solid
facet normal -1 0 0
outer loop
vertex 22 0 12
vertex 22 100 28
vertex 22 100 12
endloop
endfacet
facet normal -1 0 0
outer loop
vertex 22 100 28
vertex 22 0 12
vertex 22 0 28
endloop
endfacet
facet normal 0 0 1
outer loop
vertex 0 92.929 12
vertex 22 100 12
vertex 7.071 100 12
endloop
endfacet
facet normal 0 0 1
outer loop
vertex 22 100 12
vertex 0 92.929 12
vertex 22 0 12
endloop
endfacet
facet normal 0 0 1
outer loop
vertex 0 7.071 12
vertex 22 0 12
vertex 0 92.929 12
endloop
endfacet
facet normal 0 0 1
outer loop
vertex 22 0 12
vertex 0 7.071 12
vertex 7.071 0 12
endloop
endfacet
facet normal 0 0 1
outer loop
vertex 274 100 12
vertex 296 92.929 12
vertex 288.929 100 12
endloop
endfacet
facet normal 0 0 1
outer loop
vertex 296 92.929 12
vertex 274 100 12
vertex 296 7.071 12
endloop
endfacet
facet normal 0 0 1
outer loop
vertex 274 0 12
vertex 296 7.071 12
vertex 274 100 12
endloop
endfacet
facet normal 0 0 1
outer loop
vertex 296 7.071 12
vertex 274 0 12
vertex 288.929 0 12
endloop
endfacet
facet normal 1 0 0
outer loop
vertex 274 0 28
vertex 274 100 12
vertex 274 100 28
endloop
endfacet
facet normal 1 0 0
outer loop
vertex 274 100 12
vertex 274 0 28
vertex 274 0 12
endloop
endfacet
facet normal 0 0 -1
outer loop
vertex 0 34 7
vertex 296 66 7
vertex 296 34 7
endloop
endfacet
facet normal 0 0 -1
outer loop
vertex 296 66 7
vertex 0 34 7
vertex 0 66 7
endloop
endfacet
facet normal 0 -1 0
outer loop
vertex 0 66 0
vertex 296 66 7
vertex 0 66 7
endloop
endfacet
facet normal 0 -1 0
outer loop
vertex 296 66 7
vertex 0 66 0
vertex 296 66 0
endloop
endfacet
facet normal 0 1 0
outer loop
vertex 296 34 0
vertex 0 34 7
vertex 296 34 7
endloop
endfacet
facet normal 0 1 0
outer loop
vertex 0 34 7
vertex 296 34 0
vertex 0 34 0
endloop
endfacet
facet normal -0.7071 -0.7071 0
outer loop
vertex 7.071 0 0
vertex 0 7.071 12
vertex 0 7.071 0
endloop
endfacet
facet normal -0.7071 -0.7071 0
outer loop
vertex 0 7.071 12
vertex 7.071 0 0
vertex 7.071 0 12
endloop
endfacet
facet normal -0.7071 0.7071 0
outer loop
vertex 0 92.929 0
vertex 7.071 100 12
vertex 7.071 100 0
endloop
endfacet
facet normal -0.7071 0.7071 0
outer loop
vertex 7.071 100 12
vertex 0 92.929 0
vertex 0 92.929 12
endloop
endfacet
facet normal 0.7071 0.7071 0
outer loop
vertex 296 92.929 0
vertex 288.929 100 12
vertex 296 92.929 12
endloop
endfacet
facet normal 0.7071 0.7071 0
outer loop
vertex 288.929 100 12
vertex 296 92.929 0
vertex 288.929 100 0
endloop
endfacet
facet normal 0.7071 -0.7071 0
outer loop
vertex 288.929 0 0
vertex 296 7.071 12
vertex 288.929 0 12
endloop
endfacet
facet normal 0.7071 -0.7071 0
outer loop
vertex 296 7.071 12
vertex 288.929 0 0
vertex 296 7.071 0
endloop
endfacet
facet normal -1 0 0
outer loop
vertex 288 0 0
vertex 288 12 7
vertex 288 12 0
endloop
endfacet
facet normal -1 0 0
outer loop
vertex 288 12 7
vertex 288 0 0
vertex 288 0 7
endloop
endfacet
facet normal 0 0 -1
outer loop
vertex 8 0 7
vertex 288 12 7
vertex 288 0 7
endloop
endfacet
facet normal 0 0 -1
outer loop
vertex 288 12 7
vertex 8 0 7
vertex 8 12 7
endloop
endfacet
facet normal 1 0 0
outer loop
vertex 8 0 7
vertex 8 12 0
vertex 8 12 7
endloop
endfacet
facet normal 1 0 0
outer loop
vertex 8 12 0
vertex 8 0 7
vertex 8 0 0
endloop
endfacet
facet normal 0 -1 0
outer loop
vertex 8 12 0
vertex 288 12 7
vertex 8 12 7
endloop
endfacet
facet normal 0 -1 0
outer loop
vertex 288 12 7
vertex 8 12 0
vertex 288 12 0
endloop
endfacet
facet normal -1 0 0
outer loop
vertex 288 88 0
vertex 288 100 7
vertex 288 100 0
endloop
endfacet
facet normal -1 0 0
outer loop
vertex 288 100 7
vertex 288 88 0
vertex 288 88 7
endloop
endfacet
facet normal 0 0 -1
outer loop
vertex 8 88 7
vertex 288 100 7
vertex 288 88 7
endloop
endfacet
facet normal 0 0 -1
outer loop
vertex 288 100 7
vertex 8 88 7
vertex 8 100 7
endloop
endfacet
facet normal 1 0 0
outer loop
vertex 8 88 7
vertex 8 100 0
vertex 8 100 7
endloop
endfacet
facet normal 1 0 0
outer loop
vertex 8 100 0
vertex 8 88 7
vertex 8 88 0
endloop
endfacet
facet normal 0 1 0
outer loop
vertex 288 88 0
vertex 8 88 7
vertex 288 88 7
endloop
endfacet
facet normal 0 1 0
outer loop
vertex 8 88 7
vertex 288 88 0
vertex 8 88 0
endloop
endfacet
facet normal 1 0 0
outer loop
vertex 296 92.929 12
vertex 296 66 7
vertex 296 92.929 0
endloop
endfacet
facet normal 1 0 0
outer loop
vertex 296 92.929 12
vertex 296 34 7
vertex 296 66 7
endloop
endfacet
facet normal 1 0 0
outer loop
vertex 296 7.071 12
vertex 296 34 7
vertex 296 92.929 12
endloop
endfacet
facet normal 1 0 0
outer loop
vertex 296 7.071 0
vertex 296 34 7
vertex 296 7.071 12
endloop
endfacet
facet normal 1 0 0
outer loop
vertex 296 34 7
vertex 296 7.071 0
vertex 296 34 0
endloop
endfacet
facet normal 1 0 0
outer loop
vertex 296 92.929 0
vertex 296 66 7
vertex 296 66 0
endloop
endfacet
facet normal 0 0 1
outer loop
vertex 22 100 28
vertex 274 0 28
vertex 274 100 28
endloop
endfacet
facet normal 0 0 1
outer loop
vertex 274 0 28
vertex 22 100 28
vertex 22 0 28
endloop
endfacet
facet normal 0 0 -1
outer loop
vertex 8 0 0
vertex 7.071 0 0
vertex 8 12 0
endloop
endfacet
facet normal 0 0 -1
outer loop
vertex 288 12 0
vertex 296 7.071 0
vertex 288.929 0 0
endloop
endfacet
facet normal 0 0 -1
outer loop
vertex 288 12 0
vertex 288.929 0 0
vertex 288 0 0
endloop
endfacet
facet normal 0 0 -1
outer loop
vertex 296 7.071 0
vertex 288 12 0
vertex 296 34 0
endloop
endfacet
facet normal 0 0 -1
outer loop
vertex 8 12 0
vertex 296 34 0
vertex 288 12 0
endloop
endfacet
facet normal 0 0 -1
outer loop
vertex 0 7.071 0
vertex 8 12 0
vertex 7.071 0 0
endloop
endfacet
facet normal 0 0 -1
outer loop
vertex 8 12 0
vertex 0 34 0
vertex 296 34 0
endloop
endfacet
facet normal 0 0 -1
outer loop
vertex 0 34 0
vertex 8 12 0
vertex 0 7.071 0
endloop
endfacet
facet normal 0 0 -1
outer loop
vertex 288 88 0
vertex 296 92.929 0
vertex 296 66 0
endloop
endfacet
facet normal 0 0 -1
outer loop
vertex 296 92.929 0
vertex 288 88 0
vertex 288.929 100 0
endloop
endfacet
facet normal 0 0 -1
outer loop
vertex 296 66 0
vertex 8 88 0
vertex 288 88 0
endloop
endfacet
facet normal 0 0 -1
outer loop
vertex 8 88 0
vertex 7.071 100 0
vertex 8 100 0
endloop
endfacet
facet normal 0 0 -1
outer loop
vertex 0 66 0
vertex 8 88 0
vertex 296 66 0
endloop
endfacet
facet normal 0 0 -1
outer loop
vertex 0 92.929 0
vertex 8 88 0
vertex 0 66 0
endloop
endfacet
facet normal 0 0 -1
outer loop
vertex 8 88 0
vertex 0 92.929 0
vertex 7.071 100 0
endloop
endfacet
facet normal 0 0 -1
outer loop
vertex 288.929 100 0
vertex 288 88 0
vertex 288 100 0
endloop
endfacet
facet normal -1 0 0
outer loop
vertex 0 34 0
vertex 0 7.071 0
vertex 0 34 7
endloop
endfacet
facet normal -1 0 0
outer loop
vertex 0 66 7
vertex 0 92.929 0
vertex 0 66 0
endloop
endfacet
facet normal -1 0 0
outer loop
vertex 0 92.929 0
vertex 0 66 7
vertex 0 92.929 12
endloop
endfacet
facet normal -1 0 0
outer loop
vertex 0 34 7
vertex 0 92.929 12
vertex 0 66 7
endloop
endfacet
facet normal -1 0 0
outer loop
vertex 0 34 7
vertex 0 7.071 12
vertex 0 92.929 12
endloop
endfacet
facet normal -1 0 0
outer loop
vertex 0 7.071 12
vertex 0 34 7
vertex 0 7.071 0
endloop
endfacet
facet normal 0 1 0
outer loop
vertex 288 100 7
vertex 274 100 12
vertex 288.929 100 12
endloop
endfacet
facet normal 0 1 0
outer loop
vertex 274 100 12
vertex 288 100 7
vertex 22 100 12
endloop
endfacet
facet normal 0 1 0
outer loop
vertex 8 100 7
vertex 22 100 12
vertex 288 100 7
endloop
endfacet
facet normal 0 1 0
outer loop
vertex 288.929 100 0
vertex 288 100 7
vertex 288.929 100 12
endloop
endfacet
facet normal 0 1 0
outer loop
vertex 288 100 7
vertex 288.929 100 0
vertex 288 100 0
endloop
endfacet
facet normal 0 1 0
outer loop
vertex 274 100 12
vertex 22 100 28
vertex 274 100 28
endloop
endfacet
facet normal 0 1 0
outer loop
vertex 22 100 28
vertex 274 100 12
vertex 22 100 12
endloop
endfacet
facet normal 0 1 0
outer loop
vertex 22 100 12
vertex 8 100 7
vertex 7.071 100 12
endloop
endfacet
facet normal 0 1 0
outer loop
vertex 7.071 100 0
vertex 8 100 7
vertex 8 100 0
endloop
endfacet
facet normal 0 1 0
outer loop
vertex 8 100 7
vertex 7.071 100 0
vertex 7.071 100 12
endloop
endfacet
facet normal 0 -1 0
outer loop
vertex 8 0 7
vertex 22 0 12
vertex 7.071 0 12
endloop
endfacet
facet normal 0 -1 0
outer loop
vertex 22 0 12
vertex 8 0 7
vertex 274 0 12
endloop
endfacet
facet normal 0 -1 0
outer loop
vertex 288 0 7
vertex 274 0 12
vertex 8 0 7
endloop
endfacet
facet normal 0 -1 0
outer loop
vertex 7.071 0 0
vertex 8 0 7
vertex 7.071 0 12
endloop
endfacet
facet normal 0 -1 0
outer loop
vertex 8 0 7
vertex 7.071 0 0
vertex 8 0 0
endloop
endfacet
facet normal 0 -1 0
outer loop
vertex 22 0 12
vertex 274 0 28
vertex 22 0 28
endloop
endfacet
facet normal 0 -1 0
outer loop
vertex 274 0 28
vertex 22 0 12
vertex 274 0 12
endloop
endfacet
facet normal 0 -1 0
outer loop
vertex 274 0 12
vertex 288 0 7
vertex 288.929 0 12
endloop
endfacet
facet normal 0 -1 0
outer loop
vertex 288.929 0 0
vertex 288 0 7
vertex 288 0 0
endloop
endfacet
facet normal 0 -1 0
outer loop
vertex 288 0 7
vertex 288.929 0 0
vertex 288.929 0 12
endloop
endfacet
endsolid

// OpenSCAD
include <../src/wardrobe.scad>;
plank_yx_middle_top();
//github_openscad -o wardrobe_2/plank_yx_middle_top.stl -D wardrobe_n=2 -D cutting_edge=0 -D break_view_length=0 wardrobe_2/plank_yx_middle_top_stl.scad
